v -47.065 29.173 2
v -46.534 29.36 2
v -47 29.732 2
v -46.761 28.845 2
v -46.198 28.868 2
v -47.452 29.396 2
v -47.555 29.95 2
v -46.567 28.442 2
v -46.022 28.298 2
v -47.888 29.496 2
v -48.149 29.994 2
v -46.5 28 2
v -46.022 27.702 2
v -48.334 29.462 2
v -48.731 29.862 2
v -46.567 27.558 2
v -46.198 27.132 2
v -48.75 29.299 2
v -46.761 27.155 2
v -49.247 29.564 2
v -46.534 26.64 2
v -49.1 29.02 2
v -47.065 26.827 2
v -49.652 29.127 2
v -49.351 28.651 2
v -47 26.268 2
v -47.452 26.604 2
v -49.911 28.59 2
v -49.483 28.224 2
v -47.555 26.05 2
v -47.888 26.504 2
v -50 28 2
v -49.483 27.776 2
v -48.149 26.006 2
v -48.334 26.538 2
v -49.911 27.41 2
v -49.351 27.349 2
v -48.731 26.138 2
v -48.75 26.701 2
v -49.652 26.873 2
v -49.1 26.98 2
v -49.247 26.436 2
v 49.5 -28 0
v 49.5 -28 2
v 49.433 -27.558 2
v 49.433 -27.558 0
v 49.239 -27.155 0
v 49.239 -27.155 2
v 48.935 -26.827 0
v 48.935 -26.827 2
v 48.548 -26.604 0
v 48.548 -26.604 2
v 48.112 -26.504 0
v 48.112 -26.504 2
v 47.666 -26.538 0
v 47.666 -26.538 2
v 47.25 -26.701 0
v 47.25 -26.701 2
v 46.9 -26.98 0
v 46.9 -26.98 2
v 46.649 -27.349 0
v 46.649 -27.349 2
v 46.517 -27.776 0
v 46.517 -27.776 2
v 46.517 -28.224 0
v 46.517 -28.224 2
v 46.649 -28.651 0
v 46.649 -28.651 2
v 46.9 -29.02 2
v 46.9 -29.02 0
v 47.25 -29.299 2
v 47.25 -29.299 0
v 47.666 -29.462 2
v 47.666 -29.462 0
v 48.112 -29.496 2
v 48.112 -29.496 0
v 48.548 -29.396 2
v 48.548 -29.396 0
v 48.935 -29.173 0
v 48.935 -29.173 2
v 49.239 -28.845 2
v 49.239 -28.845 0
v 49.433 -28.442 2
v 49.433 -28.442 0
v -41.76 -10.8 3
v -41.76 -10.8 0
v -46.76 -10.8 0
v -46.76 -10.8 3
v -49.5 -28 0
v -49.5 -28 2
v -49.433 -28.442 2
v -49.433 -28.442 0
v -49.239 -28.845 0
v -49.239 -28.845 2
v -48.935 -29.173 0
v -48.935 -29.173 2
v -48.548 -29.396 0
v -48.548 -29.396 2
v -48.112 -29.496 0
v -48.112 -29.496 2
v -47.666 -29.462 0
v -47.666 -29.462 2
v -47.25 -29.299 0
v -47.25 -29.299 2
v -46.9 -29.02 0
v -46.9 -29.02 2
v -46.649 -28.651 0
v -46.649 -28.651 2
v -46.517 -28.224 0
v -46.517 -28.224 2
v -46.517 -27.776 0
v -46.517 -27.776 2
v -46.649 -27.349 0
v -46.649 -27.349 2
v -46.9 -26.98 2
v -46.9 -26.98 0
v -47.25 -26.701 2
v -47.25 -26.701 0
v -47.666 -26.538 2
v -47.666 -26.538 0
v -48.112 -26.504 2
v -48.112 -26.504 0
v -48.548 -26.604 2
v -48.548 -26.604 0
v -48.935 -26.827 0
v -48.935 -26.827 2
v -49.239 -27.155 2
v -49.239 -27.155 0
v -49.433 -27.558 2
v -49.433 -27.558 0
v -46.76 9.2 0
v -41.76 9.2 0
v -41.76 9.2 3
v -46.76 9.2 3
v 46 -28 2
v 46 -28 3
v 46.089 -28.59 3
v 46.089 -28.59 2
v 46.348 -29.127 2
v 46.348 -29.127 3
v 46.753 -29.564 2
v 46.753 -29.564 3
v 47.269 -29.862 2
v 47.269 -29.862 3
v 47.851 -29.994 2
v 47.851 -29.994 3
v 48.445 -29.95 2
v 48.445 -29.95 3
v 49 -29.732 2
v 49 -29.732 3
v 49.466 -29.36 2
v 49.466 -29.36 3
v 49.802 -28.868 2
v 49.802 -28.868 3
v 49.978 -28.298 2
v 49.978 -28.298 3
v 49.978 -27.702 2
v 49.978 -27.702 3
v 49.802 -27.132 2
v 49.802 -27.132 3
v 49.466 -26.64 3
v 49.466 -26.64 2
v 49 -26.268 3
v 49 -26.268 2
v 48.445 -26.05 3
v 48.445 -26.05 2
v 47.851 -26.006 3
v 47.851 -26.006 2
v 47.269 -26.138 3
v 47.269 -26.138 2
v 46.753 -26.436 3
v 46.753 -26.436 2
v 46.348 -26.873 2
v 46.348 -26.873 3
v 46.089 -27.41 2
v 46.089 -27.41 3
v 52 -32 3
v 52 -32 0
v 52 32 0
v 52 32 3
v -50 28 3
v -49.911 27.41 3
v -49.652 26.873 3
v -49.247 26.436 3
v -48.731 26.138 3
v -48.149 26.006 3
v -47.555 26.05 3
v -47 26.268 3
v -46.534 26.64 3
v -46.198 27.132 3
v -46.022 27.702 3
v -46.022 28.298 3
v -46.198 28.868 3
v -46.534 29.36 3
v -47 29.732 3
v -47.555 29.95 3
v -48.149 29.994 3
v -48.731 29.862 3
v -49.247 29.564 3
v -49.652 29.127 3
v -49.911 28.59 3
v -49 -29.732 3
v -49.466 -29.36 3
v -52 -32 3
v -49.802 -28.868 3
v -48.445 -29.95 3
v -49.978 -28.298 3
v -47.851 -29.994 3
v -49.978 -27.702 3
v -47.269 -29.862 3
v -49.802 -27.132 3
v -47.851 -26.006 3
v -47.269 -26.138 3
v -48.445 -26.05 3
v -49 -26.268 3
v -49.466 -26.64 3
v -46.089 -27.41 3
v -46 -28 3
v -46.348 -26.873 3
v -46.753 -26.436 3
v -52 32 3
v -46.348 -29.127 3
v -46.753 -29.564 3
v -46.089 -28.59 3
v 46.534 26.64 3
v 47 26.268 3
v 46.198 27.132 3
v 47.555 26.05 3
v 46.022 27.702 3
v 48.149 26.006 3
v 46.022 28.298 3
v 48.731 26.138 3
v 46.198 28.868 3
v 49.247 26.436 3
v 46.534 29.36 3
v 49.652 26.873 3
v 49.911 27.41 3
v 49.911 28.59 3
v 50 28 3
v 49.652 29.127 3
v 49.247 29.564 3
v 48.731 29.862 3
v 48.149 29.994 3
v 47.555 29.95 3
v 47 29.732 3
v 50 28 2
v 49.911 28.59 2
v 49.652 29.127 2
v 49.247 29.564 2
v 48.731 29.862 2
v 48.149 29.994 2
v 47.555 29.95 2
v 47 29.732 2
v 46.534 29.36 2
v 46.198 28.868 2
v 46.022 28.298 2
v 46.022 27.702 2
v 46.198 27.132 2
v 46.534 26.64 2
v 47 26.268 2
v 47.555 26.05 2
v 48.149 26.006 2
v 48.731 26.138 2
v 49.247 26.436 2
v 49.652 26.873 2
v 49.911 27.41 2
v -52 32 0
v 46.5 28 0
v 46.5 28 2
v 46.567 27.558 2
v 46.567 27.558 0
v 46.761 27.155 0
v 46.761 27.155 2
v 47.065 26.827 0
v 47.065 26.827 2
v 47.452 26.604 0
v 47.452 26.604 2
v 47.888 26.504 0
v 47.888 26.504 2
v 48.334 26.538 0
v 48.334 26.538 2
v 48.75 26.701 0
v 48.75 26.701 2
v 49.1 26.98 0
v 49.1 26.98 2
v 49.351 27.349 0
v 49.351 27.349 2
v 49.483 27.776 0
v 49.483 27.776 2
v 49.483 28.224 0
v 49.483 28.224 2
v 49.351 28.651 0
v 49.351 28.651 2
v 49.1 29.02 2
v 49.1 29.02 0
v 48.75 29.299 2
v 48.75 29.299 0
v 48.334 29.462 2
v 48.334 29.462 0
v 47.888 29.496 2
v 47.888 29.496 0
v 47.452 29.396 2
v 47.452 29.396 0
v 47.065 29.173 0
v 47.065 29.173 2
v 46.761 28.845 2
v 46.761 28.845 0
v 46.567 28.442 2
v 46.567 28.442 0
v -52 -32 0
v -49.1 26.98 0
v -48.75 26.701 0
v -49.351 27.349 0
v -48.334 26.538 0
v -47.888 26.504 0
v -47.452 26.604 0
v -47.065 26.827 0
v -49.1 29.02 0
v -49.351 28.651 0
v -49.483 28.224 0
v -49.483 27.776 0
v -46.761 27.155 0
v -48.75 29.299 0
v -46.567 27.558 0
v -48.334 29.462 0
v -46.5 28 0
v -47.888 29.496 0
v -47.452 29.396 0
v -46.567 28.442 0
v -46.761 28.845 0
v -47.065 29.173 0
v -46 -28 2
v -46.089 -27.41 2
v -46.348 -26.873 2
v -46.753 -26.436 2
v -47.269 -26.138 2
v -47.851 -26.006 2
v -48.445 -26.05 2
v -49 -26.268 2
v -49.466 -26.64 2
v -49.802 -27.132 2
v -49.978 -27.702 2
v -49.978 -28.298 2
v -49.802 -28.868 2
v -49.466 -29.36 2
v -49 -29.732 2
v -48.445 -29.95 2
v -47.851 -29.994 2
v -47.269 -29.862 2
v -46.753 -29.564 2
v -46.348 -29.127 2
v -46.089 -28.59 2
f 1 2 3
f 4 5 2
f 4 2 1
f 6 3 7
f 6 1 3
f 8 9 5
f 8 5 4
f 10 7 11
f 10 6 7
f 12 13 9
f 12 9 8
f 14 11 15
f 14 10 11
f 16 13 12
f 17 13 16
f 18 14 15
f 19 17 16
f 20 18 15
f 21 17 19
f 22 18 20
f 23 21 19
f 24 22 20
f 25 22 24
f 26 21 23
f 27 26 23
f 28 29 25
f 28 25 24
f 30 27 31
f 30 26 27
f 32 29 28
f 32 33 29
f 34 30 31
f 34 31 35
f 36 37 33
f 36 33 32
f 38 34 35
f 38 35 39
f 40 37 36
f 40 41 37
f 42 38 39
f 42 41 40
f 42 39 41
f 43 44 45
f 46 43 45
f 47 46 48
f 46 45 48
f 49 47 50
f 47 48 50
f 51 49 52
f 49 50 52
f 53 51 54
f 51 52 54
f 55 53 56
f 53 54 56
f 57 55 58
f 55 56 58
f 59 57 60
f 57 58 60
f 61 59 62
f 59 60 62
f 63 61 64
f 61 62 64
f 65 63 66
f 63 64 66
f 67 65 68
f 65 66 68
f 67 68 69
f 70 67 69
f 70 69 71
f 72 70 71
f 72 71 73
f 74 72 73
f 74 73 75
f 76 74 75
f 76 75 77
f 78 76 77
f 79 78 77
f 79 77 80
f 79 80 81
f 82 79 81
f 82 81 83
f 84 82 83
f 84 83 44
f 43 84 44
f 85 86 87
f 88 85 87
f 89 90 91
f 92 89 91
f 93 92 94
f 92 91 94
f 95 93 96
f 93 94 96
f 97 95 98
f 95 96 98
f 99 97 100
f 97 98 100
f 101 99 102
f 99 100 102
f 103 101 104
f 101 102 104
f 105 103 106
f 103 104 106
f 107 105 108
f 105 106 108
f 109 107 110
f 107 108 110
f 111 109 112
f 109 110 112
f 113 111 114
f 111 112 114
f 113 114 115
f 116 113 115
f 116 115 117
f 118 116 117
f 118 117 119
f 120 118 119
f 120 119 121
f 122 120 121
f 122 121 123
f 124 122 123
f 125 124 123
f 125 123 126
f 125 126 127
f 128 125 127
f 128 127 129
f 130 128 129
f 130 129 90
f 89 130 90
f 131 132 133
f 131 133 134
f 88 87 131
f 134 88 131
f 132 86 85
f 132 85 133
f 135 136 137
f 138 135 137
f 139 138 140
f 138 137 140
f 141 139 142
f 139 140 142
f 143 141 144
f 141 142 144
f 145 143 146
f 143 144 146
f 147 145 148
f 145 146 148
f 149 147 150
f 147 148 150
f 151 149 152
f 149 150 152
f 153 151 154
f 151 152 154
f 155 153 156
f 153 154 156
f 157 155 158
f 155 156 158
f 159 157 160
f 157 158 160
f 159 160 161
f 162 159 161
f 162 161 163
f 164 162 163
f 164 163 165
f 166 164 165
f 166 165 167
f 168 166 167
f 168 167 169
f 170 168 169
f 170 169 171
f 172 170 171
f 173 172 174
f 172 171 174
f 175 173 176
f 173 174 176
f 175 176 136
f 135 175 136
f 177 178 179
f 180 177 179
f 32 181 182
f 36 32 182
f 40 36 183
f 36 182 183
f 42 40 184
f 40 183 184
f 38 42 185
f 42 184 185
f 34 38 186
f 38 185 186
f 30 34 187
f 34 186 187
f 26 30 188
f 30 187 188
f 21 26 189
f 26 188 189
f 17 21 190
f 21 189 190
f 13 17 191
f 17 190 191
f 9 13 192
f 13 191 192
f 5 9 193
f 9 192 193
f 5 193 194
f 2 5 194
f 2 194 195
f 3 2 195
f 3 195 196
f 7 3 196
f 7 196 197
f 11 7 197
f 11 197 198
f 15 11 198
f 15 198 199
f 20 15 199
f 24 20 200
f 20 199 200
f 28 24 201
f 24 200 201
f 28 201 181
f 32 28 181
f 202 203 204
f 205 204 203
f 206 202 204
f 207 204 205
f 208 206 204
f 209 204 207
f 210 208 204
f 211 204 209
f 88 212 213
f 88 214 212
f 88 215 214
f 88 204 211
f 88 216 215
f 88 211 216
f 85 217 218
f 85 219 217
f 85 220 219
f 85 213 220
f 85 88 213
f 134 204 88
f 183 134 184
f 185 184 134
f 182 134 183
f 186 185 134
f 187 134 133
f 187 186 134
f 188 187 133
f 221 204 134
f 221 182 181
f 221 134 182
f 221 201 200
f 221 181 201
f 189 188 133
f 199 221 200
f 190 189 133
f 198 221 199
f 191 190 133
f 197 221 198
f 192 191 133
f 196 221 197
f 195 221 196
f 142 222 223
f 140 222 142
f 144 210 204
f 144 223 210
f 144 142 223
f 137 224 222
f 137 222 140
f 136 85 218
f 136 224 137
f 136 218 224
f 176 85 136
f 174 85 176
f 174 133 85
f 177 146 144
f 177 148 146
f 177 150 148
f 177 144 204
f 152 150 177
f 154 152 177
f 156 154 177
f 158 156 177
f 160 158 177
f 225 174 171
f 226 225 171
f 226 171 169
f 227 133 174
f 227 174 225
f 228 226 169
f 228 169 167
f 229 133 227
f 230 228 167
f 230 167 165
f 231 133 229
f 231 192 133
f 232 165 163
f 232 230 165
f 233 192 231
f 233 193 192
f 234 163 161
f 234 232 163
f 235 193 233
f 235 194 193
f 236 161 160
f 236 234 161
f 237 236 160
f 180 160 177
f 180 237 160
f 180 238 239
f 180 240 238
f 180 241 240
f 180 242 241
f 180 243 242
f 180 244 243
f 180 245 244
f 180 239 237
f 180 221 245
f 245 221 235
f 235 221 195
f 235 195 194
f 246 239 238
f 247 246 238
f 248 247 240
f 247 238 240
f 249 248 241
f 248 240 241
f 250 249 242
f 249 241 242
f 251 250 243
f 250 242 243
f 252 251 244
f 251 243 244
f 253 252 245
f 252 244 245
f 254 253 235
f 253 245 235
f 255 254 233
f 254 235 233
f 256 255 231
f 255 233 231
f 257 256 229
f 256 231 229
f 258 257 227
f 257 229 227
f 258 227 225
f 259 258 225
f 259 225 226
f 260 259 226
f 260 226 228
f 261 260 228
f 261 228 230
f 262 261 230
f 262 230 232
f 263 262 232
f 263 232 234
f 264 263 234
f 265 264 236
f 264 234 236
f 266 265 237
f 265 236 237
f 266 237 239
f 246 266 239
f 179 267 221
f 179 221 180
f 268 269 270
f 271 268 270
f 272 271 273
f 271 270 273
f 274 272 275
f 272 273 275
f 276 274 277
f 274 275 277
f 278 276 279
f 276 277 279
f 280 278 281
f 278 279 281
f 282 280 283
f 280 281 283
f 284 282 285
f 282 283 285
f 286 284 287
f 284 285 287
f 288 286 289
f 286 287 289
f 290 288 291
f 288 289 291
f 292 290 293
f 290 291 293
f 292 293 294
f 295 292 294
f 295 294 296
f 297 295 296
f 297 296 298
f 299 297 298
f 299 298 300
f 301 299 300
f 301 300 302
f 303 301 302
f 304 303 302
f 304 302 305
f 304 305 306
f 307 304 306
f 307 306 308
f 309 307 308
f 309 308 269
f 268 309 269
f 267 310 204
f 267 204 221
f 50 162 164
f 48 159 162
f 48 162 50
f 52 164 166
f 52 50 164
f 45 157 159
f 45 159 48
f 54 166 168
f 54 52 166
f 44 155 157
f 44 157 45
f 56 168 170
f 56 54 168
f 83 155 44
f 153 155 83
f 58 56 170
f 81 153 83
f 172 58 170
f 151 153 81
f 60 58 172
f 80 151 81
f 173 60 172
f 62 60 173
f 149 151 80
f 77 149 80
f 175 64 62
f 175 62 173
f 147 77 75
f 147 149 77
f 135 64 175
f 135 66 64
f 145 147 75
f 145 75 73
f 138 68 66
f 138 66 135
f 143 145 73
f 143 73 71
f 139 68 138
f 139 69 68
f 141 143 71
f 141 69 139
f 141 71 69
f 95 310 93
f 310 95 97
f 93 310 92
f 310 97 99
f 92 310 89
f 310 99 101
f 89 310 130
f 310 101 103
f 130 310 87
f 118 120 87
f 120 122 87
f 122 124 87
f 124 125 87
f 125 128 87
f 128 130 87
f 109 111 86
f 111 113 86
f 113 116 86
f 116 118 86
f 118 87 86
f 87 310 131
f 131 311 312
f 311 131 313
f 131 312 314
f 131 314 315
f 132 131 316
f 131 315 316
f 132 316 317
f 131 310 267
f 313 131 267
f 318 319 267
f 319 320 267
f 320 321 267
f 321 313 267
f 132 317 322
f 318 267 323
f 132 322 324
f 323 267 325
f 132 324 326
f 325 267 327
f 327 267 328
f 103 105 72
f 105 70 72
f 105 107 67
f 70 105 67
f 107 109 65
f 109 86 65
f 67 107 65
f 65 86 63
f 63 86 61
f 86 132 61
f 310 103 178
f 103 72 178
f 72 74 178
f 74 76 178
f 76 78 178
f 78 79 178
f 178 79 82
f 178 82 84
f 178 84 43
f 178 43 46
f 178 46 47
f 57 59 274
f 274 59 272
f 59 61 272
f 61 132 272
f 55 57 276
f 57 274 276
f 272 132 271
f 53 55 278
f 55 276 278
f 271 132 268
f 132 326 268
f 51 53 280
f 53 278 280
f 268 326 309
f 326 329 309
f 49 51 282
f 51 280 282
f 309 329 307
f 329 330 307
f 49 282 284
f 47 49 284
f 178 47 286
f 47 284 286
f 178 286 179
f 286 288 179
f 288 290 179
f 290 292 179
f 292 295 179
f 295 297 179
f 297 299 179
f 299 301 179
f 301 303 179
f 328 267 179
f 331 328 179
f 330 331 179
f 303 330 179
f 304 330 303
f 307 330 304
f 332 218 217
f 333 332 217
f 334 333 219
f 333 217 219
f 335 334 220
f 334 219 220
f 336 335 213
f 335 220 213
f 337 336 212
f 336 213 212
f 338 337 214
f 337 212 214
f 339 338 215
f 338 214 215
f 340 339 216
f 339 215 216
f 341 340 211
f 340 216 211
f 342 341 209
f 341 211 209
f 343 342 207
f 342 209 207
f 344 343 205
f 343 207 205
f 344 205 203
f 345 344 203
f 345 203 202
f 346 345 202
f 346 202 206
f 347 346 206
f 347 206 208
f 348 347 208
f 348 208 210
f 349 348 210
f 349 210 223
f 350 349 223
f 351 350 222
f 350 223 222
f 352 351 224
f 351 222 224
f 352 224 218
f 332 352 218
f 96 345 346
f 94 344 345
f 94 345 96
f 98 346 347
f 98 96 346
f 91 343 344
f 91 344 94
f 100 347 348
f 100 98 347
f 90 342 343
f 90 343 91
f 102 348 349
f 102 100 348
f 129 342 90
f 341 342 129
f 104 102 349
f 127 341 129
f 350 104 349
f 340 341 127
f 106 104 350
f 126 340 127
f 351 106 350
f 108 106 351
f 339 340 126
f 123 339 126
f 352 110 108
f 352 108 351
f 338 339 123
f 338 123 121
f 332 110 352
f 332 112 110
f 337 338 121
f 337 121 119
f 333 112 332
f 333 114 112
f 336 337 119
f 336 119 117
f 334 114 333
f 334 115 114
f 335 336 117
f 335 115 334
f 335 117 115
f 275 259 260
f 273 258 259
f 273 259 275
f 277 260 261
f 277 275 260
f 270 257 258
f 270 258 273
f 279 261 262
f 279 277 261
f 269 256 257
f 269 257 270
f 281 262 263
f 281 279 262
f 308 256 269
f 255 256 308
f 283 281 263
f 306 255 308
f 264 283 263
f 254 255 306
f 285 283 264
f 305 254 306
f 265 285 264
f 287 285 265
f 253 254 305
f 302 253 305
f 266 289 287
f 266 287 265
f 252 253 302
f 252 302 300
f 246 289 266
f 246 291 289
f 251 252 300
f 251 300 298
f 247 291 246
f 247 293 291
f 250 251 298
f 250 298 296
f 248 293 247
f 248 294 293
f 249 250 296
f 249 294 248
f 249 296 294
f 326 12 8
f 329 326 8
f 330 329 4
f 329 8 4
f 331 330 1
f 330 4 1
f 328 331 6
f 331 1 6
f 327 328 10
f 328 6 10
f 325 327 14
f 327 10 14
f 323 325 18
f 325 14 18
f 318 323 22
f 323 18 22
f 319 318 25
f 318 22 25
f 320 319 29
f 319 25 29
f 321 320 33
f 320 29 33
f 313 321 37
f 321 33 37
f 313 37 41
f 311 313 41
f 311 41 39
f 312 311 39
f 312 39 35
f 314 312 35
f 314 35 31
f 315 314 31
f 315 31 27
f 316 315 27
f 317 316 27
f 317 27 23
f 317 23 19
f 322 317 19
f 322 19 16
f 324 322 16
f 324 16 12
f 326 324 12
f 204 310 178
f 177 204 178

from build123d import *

# Parameters (mm, degrees)
SKETCH_1_W          = 104
SKETCH_1_H          = 64
EXTRUDE_1_DEPTH     = 3
SKETCH_2_R          = 1.5
CUT_EXTRUDE_1_DEPTH = 62.131006862
SKETCH_3_W          = 5
SKETCH_3_H          = 20
CUT_EXTRUDE_2_DEPTH = 62.131006862
SKETCH_4_R          = 2
CUT_EXTRUDE_3_DEPTH = 1


with BuildPart() as part:
    # 草图1 → 凸台-拉伸1 (new body)
    with BuildSketch(Plane.XY):
        Rectangle(SKETCH_1_W, SKETCH_1_H)
    extrude(amount=EXTRUDE_1_DEPTH)

    # 草图2 → 切除-拉伸1 (cut, through all)
    with BuildSketch(Plane.XY.offset(3)):
        with Locations((-48, 28)):
            Circle(SKETCH_2_R)
        with Locations(Location((48, 28, 0), (0, 0, 180))):
            Circle(SKETCH_2_R)
        with Locations((48, -28)):
            Circle(SKETCH_2_R)
        with Locations(Location((-48, -28, 0), (0, 0, 180))):
            Circle(SKETCH_2_R)
    extrude(amount=-CUT_EXTRUDE_1_DEPTH, mode=Mode.SUBTRACT)

    # 草图3 → 切除-拉伸2 (cut, through all)
    with BuildSketch(Plane(origin=(0, 0, 0), x_dir=(-1, 0, 0), z_dir=(0, 0, -1))):
        with Locations((44.26005687, -0.800014708)):
            Rectangle(SKETCH_3_W, SKETCH_3_H)
    extrude(amount=-CUT_EXTRUDE_2_DEPTH, mode=Mode.SUBTRACT)

    # 草图4 → 切除-拉伸3 (cut)
    with BuildSketch(Plane.XY.offset(3)):
        with Locations((48, 28)):
            Circle(SKETCH_4_R)
        with Locations(Location((-48, 28, 0), (0, 0, 180))):
            Circle(SKETCH_4_R)
        with Locations((-48, -28)):
            Circle(SKETCH_4_R)
        with Locations(Location((48, -28, 0), (0, 0, 180))):
            Circle(SKETCH_4_R)
    extrude(amount=-CUT_EXTRUDE_3_DEPTH, mode=Mode.SUBTRACT)


solid = part.part
